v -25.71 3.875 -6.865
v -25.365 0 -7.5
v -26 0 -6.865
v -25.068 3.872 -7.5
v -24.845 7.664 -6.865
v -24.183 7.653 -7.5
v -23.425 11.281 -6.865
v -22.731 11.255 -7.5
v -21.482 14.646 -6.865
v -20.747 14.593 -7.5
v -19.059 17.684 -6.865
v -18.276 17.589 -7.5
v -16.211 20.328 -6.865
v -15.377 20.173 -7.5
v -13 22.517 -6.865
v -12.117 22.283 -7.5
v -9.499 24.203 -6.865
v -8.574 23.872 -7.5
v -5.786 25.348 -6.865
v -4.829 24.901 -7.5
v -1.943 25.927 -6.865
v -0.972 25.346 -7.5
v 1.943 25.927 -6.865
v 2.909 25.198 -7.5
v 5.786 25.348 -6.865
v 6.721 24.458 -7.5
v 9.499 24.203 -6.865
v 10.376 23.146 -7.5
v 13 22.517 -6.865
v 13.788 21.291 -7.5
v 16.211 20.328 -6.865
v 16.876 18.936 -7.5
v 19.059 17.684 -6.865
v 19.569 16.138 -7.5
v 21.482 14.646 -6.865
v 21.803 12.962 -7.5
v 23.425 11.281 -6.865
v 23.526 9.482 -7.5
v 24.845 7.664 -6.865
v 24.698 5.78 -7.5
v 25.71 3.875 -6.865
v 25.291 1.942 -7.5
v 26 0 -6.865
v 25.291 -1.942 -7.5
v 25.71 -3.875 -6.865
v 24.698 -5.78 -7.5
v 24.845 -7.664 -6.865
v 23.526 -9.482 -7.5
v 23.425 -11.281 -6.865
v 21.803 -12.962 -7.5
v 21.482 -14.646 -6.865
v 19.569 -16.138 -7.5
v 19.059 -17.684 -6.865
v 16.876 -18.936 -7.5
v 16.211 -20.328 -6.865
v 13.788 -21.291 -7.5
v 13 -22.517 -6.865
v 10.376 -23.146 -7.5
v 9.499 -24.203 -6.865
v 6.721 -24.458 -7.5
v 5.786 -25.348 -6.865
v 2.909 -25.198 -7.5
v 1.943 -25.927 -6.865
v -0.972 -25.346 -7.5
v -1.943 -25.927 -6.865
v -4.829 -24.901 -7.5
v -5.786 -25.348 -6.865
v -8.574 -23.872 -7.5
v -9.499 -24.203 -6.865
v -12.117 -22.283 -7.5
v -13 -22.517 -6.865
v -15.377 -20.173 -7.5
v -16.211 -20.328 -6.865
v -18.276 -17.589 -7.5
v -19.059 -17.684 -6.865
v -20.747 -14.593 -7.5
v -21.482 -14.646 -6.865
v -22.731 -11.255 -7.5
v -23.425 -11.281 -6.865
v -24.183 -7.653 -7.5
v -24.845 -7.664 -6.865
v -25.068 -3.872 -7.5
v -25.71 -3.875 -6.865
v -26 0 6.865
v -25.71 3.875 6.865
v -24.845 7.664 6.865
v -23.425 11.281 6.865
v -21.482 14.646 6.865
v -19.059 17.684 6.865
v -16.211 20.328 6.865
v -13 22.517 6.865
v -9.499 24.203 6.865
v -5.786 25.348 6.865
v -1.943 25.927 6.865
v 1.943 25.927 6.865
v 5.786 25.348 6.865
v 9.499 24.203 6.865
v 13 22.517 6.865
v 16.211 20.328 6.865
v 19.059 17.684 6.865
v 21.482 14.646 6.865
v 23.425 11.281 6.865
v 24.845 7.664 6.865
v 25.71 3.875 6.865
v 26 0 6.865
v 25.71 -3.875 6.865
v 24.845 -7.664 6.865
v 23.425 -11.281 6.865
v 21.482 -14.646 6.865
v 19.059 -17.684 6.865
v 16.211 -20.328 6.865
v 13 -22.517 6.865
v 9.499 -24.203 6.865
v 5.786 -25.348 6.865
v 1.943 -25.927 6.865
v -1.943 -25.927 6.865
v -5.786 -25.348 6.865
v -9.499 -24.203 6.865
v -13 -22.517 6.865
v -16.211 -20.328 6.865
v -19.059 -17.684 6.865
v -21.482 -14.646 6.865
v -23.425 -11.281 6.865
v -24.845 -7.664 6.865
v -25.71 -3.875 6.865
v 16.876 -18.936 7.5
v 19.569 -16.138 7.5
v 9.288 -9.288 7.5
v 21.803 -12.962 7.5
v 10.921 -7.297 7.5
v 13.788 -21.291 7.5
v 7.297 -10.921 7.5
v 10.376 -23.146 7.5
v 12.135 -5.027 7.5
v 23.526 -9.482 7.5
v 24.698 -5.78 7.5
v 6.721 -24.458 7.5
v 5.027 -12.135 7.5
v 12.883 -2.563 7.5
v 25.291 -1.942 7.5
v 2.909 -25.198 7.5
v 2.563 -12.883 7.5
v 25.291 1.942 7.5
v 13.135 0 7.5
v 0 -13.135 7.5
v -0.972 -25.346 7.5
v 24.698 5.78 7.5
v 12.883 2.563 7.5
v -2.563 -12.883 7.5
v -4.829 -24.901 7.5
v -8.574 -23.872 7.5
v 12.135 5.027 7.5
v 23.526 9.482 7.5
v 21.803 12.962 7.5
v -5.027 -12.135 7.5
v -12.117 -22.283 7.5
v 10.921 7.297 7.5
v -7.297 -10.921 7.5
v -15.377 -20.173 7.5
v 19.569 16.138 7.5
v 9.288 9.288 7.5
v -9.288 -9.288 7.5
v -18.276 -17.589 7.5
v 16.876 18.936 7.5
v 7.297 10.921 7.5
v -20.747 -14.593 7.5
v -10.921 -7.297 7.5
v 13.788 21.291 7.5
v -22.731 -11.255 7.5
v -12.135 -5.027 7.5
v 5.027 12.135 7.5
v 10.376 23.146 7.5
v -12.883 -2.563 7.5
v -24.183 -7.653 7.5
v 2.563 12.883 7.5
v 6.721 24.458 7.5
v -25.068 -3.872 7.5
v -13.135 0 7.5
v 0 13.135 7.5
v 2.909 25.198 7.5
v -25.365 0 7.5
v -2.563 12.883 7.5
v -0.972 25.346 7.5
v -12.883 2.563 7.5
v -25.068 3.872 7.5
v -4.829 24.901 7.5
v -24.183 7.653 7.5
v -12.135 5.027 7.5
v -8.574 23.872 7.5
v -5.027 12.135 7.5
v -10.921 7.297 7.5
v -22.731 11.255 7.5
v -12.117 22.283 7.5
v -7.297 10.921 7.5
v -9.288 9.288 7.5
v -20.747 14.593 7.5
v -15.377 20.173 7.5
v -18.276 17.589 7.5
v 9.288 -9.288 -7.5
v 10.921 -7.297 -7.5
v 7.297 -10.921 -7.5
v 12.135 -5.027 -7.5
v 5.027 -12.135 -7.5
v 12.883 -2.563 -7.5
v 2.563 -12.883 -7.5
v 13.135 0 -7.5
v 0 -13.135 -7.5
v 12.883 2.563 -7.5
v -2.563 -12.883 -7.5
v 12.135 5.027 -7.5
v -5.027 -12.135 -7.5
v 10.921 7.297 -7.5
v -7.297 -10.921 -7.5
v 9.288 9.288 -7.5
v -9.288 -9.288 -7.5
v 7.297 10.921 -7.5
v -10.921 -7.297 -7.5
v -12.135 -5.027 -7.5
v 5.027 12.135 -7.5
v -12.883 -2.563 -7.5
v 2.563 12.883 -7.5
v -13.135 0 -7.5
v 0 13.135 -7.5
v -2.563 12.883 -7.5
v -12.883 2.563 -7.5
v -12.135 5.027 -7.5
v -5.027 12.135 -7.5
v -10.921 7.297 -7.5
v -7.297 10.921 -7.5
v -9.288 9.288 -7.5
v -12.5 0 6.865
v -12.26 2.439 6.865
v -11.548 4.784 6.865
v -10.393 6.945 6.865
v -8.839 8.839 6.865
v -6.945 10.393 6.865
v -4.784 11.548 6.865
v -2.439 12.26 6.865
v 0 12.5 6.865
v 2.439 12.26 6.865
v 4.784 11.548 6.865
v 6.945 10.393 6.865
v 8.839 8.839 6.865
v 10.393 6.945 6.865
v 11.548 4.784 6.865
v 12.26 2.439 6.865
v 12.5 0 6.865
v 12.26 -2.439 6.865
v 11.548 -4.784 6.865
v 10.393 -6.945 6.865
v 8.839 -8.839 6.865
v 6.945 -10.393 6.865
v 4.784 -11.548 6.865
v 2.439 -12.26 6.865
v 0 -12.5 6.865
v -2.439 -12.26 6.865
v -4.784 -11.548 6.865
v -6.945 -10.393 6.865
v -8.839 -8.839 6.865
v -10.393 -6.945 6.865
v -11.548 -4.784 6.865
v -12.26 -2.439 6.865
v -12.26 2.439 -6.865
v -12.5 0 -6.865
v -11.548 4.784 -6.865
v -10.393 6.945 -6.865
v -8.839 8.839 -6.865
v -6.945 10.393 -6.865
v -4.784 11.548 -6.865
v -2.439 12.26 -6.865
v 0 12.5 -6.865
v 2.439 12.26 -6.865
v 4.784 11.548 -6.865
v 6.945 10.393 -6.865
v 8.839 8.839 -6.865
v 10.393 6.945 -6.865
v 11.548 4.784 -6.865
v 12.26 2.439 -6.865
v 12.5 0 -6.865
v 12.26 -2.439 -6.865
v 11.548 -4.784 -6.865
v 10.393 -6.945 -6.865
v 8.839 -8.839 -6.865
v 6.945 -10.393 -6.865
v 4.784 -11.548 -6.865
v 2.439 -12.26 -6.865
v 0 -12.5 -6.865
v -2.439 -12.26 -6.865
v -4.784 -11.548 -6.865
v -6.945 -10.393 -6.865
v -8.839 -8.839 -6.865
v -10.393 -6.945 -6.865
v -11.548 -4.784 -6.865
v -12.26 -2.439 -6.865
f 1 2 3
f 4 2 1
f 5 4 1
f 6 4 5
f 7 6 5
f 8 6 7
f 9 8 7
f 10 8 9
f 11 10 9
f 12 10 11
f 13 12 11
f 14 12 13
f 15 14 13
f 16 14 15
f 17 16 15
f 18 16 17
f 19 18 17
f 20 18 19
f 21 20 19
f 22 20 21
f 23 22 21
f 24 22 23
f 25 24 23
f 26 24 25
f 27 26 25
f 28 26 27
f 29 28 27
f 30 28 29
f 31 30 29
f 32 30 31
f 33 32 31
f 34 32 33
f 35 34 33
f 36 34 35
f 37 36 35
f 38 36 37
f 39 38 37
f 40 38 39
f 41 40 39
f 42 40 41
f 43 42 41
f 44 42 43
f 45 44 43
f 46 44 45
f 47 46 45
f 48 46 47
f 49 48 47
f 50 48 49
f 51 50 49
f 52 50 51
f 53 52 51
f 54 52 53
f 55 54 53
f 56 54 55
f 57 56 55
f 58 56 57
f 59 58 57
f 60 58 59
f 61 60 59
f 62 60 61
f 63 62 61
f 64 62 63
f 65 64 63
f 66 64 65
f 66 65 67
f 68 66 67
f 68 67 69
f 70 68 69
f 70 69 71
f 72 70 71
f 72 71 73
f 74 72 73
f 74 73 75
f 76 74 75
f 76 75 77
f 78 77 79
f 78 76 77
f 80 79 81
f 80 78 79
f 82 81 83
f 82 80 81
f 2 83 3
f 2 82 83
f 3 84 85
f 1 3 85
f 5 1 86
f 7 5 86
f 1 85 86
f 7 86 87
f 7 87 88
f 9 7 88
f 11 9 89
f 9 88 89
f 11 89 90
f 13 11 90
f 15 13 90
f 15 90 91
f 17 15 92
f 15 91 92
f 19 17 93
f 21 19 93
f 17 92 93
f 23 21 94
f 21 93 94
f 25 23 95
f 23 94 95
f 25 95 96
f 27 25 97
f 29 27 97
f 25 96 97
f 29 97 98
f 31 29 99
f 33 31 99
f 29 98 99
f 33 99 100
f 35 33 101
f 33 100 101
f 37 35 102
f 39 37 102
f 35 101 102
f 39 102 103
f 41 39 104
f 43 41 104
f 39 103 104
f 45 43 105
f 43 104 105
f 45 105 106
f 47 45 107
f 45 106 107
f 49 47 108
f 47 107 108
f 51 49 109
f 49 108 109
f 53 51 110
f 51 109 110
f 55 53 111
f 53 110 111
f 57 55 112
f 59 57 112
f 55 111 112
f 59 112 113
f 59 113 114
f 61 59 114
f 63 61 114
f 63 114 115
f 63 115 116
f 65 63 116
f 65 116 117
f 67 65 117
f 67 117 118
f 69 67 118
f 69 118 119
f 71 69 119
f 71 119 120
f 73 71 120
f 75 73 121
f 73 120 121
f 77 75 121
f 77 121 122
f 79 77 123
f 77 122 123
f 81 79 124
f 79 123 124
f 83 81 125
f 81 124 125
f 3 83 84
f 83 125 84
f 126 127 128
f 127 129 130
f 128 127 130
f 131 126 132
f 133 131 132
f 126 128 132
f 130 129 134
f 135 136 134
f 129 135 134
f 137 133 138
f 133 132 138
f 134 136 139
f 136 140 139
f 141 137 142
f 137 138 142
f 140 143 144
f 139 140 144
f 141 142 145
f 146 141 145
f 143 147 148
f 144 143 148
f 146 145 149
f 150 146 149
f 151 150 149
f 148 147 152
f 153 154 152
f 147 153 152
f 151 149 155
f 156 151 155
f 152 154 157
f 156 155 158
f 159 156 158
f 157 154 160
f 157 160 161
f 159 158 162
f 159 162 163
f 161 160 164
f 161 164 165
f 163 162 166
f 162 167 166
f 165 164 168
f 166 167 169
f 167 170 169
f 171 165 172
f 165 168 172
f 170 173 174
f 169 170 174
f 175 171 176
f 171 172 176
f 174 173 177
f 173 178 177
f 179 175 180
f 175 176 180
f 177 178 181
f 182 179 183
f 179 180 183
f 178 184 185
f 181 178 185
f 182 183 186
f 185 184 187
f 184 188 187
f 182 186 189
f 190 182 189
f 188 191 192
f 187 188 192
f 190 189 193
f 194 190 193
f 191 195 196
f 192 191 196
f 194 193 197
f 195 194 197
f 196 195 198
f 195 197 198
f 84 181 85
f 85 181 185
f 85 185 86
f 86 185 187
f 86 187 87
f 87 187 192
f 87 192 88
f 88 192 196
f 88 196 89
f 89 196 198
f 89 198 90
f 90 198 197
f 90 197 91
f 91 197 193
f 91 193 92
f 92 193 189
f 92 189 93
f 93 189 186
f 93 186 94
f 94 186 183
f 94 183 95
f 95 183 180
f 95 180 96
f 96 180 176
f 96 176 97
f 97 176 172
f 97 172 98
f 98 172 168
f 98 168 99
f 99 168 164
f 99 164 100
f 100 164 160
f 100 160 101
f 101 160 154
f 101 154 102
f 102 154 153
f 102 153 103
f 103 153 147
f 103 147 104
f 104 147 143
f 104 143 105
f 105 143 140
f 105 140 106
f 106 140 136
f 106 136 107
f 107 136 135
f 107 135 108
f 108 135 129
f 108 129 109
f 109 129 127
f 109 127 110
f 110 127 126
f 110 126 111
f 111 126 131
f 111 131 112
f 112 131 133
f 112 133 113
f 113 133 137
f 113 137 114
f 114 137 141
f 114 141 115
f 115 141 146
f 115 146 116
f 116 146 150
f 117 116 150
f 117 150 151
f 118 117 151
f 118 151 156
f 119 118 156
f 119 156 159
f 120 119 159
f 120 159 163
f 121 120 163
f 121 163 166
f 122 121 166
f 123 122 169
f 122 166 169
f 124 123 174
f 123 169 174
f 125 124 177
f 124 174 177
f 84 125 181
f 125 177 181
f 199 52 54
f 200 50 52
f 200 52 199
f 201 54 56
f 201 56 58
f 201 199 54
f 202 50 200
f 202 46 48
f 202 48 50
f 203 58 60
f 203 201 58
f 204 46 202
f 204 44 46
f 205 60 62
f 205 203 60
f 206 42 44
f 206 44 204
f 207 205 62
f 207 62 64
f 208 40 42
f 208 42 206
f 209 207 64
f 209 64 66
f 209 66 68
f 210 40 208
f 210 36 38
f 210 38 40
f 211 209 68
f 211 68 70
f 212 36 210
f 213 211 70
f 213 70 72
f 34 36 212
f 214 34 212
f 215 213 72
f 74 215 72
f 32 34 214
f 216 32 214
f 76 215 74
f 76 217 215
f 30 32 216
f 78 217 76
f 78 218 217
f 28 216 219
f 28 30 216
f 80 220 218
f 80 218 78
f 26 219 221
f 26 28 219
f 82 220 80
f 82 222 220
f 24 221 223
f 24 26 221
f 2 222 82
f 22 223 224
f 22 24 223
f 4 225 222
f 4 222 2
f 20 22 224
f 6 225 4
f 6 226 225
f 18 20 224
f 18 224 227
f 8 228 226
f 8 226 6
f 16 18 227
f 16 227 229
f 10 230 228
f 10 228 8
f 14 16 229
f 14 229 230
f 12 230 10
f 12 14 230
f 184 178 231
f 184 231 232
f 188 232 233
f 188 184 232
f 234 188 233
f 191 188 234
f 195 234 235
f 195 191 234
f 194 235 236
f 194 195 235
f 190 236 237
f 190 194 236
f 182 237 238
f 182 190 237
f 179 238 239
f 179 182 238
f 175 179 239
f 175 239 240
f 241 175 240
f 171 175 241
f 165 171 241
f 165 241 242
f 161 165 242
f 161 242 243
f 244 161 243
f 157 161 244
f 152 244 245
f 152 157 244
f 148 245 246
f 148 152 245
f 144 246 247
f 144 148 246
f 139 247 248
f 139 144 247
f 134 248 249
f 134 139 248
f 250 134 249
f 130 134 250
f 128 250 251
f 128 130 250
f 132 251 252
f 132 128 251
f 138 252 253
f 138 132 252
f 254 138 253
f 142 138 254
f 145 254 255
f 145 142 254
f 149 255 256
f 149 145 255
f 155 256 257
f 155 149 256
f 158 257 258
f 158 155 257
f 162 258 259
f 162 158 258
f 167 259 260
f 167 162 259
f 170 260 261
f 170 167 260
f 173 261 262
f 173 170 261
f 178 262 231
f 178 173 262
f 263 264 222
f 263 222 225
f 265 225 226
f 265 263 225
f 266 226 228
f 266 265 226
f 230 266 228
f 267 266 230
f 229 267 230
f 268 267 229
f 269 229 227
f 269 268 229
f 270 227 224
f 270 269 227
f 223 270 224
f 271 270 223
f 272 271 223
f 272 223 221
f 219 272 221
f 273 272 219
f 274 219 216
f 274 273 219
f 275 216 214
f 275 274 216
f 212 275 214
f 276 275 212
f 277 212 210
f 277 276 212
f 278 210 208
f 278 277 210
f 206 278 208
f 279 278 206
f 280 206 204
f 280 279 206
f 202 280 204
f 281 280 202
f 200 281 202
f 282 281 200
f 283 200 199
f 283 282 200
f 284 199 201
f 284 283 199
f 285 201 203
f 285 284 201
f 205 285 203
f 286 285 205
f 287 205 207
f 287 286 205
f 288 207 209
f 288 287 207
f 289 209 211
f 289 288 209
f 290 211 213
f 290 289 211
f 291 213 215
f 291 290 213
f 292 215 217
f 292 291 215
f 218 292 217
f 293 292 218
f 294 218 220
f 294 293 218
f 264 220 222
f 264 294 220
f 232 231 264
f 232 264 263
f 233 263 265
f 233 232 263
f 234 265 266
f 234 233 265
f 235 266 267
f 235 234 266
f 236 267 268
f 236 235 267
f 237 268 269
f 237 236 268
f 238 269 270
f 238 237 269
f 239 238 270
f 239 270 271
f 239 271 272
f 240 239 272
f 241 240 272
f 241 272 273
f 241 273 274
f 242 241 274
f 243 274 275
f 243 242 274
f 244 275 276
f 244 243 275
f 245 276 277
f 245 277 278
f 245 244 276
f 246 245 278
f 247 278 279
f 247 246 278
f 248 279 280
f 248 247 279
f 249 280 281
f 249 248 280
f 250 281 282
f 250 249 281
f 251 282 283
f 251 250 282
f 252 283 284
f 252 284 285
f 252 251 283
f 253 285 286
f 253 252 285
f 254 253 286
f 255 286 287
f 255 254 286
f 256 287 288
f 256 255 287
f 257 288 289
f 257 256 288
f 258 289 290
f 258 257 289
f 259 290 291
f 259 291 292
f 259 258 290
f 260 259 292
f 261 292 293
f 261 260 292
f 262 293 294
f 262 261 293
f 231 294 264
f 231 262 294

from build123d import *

# Parameters (mm, degrees)
F0_W    = 13.5
F0_H    = 15
F2_SIZE = 0.635


with BuildPart() as f1:
    # F0 (on Front) → F1 (revolve)
    with BuildSketch(Plane.XZ):
        with Locations((-19.25, 0)):
            Rectangle(F0_W, F0_H)
    revolve(axis=Axis((0, 0, 3.400517), (0, 0, -1)))

    # F2
    f2_edges = [f1.edges().sort_by_distance(p)[0] for p in [
        (26, 0, 7.5),
        (26, 0, -7.5),
        (12.5, 0, 7.5),
        (12.5, 0, -7.5),
    ]]
    chamfer(f2_edges, length=F2_SIZE)


solid = f1.part
